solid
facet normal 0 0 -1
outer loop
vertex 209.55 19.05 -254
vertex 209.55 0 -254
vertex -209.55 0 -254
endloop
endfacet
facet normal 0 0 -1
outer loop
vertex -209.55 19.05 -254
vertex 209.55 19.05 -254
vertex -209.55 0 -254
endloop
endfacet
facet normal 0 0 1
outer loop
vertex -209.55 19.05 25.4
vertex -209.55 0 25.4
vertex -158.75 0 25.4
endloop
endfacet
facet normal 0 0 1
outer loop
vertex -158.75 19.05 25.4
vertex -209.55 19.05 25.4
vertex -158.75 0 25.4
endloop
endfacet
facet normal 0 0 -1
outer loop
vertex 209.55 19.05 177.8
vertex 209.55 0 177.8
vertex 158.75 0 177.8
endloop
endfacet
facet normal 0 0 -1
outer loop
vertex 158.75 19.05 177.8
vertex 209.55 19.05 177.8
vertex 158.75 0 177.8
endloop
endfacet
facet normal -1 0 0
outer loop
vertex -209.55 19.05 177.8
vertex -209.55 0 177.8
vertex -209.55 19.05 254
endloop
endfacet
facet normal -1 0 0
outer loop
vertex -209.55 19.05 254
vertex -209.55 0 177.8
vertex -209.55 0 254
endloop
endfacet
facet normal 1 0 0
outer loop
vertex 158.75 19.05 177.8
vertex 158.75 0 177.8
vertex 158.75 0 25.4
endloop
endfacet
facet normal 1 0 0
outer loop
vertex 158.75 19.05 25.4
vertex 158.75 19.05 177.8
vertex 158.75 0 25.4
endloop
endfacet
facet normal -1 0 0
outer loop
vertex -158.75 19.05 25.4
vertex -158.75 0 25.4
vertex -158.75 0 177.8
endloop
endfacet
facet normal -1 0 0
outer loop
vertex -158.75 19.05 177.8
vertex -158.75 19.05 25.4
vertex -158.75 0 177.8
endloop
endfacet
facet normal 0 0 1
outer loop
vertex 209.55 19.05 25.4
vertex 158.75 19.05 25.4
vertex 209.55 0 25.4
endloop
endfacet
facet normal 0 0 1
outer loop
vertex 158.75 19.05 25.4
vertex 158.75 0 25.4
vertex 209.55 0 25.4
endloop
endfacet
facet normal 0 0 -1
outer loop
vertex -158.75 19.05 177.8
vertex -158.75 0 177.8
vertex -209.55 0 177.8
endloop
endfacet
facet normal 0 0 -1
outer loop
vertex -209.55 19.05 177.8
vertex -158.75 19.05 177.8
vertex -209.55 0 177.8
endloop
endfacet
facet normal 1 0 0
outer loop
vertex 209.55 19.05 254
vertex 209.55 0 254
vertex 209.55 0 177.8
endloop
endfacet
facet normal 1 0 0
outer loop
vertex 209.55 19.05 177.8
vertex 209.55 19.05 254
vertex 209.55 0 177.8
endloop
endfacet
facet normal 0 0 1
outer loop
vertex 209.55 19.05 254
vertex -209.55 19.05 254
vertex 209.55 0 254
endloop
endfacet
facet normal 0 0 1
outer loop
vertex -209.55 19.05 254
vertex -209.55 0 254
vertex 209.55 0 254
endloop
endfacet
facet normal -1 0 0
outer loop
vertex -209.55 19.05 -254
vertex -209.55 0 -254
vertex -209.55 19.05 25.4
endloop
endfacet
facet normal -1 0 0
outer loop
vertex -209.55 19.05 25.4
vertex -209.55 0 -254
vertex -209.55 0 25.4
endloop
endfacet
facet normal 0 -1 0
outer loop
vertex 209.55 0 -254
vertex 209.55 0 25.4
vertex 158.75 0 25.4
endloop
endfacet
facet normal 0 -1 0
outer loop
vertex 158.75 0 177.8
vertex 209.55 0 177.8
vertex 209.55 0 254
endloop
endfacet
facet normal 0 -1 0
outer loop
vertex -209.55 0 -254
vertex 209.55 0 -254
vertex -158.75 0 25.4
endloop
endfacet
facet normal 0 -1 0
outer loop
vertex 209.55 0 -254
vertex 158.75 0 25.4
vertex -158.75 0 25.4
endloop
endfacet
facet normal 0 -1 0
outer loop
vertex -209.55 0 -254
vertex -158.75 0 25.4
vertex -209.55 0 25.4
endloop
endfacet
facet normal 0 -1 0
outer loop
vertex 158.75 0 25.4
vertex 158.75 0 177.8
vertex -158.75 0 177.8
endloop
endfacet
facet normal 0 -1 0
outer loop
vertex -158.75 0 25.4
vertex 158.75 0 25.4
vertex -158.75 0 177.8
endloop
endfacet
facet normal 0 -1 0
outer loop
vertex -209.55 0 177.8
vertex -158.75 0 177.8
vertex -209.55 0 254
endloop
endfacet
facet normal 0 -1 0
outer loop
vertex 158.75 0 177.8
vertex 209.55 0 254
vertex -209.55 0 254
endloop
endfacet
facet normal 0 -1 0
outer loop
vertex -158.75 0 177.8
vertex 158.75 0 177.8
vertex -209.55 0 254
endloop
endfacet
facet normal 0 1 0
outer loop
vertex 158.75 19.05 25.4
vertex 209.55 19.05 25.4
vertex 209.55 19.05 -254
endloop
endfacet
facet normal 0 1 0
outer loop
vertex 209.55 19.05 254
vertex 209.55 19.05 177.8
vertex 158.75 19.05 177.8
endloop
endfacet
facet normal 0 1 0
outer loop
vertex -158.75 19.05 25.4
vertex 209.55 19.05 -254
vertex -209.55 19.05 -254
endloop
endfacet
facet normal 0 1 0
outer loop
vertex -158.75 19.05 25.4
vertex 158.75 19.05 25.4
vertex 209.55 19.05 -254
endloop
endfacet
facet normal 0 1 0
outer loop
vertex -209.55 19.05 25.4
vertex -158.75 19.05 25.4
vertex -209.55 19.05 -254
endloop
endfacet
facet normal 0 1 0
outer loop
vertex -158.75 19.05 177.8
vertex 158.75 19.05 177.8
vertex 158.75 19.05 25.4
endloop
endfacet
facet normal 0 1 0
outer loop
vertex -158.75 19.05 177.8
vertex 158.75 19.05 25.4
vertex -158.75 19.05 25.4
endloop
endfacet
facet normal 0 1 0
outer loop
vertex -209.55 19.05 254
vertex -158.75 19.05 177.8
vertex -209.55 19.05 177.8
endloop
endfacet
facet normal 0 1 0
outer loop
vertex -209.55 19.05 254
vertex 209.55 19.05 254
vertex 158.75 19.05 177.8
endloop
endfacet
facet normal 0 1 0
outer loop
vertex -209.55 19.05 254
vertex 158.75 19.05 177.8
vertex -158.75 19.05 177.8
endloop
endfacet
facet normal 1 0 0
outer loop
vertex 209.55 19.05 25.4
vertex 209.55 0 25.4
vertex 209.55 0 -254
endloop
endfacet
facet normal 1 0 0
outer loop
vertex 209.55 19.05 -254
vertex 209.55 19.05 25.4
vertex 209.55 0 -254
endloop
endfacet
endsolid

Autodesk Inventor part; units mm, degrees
ref_plane "XZ Plane" through (0, 0, 0) normal (0, 1, 0) x (-1, 0, 0)
ref_plane "XY Plane" through (0, 0, 0) normal (0, 0, 1) x (1, 0, 0)
sketch "Sketch1" plane through (0, 0, 0) normal (0, 1, 0) x (-1, 0, 0)
  line L0 (-209.55, 254) -> (-209.55, -254)
  line L1 (-209.55, -254) -> (209.55, -254)
  line L2 (209.55, -254) -> (209.55, 254)
  line L3 (209.55, 254) -> (-209.55, 254)
  line L4 (-209.55, 254) -> (209.55, -254) construction
  line L5 (-209.55, -254) -> (209.55, 254) construction
  point P0 (0, 0)
  dimension "baseLength" = 508
  dimension "baseWidth" = 419.1
extrude "Extrusion1" add sketch "Sketch1" along normal blind 19.05
sketch "Sketch2" plane through (0, 0, 0) normal (0, -1, 0) x (1, 0, 0)
  line L0 (209.55, 254) -> (209.55, -254) projected
  line L1 (209.55, 177.8) -> (158.75, 177.8)
  line L2 (158.75, 177.8) -> (158.75, 25.4)
  line L3 (158.75, 25.4) -> (209.55, 25.4)
  line L4 (209.55, 25.4) -> (209.55, 177.8)
  line L5 (-209.55, 254) -> (209.55, 254) projected
  point P0 (0, 0)
  dimension "backToEndOfGearBox" = 76.2
  dimension "backToFrontOfGearBox" = 228.6
  dimension "wdithForGearBox" = 50.8
extrude "Extrusion2" cut sketch "Sketch2" against normal through all
mirror "Mirror1" about plane through (0, 0, 0) normal (1, 0, 0) of "Extrusion2"
properties part number "BasePlate" material "Wood (Walnut)"
